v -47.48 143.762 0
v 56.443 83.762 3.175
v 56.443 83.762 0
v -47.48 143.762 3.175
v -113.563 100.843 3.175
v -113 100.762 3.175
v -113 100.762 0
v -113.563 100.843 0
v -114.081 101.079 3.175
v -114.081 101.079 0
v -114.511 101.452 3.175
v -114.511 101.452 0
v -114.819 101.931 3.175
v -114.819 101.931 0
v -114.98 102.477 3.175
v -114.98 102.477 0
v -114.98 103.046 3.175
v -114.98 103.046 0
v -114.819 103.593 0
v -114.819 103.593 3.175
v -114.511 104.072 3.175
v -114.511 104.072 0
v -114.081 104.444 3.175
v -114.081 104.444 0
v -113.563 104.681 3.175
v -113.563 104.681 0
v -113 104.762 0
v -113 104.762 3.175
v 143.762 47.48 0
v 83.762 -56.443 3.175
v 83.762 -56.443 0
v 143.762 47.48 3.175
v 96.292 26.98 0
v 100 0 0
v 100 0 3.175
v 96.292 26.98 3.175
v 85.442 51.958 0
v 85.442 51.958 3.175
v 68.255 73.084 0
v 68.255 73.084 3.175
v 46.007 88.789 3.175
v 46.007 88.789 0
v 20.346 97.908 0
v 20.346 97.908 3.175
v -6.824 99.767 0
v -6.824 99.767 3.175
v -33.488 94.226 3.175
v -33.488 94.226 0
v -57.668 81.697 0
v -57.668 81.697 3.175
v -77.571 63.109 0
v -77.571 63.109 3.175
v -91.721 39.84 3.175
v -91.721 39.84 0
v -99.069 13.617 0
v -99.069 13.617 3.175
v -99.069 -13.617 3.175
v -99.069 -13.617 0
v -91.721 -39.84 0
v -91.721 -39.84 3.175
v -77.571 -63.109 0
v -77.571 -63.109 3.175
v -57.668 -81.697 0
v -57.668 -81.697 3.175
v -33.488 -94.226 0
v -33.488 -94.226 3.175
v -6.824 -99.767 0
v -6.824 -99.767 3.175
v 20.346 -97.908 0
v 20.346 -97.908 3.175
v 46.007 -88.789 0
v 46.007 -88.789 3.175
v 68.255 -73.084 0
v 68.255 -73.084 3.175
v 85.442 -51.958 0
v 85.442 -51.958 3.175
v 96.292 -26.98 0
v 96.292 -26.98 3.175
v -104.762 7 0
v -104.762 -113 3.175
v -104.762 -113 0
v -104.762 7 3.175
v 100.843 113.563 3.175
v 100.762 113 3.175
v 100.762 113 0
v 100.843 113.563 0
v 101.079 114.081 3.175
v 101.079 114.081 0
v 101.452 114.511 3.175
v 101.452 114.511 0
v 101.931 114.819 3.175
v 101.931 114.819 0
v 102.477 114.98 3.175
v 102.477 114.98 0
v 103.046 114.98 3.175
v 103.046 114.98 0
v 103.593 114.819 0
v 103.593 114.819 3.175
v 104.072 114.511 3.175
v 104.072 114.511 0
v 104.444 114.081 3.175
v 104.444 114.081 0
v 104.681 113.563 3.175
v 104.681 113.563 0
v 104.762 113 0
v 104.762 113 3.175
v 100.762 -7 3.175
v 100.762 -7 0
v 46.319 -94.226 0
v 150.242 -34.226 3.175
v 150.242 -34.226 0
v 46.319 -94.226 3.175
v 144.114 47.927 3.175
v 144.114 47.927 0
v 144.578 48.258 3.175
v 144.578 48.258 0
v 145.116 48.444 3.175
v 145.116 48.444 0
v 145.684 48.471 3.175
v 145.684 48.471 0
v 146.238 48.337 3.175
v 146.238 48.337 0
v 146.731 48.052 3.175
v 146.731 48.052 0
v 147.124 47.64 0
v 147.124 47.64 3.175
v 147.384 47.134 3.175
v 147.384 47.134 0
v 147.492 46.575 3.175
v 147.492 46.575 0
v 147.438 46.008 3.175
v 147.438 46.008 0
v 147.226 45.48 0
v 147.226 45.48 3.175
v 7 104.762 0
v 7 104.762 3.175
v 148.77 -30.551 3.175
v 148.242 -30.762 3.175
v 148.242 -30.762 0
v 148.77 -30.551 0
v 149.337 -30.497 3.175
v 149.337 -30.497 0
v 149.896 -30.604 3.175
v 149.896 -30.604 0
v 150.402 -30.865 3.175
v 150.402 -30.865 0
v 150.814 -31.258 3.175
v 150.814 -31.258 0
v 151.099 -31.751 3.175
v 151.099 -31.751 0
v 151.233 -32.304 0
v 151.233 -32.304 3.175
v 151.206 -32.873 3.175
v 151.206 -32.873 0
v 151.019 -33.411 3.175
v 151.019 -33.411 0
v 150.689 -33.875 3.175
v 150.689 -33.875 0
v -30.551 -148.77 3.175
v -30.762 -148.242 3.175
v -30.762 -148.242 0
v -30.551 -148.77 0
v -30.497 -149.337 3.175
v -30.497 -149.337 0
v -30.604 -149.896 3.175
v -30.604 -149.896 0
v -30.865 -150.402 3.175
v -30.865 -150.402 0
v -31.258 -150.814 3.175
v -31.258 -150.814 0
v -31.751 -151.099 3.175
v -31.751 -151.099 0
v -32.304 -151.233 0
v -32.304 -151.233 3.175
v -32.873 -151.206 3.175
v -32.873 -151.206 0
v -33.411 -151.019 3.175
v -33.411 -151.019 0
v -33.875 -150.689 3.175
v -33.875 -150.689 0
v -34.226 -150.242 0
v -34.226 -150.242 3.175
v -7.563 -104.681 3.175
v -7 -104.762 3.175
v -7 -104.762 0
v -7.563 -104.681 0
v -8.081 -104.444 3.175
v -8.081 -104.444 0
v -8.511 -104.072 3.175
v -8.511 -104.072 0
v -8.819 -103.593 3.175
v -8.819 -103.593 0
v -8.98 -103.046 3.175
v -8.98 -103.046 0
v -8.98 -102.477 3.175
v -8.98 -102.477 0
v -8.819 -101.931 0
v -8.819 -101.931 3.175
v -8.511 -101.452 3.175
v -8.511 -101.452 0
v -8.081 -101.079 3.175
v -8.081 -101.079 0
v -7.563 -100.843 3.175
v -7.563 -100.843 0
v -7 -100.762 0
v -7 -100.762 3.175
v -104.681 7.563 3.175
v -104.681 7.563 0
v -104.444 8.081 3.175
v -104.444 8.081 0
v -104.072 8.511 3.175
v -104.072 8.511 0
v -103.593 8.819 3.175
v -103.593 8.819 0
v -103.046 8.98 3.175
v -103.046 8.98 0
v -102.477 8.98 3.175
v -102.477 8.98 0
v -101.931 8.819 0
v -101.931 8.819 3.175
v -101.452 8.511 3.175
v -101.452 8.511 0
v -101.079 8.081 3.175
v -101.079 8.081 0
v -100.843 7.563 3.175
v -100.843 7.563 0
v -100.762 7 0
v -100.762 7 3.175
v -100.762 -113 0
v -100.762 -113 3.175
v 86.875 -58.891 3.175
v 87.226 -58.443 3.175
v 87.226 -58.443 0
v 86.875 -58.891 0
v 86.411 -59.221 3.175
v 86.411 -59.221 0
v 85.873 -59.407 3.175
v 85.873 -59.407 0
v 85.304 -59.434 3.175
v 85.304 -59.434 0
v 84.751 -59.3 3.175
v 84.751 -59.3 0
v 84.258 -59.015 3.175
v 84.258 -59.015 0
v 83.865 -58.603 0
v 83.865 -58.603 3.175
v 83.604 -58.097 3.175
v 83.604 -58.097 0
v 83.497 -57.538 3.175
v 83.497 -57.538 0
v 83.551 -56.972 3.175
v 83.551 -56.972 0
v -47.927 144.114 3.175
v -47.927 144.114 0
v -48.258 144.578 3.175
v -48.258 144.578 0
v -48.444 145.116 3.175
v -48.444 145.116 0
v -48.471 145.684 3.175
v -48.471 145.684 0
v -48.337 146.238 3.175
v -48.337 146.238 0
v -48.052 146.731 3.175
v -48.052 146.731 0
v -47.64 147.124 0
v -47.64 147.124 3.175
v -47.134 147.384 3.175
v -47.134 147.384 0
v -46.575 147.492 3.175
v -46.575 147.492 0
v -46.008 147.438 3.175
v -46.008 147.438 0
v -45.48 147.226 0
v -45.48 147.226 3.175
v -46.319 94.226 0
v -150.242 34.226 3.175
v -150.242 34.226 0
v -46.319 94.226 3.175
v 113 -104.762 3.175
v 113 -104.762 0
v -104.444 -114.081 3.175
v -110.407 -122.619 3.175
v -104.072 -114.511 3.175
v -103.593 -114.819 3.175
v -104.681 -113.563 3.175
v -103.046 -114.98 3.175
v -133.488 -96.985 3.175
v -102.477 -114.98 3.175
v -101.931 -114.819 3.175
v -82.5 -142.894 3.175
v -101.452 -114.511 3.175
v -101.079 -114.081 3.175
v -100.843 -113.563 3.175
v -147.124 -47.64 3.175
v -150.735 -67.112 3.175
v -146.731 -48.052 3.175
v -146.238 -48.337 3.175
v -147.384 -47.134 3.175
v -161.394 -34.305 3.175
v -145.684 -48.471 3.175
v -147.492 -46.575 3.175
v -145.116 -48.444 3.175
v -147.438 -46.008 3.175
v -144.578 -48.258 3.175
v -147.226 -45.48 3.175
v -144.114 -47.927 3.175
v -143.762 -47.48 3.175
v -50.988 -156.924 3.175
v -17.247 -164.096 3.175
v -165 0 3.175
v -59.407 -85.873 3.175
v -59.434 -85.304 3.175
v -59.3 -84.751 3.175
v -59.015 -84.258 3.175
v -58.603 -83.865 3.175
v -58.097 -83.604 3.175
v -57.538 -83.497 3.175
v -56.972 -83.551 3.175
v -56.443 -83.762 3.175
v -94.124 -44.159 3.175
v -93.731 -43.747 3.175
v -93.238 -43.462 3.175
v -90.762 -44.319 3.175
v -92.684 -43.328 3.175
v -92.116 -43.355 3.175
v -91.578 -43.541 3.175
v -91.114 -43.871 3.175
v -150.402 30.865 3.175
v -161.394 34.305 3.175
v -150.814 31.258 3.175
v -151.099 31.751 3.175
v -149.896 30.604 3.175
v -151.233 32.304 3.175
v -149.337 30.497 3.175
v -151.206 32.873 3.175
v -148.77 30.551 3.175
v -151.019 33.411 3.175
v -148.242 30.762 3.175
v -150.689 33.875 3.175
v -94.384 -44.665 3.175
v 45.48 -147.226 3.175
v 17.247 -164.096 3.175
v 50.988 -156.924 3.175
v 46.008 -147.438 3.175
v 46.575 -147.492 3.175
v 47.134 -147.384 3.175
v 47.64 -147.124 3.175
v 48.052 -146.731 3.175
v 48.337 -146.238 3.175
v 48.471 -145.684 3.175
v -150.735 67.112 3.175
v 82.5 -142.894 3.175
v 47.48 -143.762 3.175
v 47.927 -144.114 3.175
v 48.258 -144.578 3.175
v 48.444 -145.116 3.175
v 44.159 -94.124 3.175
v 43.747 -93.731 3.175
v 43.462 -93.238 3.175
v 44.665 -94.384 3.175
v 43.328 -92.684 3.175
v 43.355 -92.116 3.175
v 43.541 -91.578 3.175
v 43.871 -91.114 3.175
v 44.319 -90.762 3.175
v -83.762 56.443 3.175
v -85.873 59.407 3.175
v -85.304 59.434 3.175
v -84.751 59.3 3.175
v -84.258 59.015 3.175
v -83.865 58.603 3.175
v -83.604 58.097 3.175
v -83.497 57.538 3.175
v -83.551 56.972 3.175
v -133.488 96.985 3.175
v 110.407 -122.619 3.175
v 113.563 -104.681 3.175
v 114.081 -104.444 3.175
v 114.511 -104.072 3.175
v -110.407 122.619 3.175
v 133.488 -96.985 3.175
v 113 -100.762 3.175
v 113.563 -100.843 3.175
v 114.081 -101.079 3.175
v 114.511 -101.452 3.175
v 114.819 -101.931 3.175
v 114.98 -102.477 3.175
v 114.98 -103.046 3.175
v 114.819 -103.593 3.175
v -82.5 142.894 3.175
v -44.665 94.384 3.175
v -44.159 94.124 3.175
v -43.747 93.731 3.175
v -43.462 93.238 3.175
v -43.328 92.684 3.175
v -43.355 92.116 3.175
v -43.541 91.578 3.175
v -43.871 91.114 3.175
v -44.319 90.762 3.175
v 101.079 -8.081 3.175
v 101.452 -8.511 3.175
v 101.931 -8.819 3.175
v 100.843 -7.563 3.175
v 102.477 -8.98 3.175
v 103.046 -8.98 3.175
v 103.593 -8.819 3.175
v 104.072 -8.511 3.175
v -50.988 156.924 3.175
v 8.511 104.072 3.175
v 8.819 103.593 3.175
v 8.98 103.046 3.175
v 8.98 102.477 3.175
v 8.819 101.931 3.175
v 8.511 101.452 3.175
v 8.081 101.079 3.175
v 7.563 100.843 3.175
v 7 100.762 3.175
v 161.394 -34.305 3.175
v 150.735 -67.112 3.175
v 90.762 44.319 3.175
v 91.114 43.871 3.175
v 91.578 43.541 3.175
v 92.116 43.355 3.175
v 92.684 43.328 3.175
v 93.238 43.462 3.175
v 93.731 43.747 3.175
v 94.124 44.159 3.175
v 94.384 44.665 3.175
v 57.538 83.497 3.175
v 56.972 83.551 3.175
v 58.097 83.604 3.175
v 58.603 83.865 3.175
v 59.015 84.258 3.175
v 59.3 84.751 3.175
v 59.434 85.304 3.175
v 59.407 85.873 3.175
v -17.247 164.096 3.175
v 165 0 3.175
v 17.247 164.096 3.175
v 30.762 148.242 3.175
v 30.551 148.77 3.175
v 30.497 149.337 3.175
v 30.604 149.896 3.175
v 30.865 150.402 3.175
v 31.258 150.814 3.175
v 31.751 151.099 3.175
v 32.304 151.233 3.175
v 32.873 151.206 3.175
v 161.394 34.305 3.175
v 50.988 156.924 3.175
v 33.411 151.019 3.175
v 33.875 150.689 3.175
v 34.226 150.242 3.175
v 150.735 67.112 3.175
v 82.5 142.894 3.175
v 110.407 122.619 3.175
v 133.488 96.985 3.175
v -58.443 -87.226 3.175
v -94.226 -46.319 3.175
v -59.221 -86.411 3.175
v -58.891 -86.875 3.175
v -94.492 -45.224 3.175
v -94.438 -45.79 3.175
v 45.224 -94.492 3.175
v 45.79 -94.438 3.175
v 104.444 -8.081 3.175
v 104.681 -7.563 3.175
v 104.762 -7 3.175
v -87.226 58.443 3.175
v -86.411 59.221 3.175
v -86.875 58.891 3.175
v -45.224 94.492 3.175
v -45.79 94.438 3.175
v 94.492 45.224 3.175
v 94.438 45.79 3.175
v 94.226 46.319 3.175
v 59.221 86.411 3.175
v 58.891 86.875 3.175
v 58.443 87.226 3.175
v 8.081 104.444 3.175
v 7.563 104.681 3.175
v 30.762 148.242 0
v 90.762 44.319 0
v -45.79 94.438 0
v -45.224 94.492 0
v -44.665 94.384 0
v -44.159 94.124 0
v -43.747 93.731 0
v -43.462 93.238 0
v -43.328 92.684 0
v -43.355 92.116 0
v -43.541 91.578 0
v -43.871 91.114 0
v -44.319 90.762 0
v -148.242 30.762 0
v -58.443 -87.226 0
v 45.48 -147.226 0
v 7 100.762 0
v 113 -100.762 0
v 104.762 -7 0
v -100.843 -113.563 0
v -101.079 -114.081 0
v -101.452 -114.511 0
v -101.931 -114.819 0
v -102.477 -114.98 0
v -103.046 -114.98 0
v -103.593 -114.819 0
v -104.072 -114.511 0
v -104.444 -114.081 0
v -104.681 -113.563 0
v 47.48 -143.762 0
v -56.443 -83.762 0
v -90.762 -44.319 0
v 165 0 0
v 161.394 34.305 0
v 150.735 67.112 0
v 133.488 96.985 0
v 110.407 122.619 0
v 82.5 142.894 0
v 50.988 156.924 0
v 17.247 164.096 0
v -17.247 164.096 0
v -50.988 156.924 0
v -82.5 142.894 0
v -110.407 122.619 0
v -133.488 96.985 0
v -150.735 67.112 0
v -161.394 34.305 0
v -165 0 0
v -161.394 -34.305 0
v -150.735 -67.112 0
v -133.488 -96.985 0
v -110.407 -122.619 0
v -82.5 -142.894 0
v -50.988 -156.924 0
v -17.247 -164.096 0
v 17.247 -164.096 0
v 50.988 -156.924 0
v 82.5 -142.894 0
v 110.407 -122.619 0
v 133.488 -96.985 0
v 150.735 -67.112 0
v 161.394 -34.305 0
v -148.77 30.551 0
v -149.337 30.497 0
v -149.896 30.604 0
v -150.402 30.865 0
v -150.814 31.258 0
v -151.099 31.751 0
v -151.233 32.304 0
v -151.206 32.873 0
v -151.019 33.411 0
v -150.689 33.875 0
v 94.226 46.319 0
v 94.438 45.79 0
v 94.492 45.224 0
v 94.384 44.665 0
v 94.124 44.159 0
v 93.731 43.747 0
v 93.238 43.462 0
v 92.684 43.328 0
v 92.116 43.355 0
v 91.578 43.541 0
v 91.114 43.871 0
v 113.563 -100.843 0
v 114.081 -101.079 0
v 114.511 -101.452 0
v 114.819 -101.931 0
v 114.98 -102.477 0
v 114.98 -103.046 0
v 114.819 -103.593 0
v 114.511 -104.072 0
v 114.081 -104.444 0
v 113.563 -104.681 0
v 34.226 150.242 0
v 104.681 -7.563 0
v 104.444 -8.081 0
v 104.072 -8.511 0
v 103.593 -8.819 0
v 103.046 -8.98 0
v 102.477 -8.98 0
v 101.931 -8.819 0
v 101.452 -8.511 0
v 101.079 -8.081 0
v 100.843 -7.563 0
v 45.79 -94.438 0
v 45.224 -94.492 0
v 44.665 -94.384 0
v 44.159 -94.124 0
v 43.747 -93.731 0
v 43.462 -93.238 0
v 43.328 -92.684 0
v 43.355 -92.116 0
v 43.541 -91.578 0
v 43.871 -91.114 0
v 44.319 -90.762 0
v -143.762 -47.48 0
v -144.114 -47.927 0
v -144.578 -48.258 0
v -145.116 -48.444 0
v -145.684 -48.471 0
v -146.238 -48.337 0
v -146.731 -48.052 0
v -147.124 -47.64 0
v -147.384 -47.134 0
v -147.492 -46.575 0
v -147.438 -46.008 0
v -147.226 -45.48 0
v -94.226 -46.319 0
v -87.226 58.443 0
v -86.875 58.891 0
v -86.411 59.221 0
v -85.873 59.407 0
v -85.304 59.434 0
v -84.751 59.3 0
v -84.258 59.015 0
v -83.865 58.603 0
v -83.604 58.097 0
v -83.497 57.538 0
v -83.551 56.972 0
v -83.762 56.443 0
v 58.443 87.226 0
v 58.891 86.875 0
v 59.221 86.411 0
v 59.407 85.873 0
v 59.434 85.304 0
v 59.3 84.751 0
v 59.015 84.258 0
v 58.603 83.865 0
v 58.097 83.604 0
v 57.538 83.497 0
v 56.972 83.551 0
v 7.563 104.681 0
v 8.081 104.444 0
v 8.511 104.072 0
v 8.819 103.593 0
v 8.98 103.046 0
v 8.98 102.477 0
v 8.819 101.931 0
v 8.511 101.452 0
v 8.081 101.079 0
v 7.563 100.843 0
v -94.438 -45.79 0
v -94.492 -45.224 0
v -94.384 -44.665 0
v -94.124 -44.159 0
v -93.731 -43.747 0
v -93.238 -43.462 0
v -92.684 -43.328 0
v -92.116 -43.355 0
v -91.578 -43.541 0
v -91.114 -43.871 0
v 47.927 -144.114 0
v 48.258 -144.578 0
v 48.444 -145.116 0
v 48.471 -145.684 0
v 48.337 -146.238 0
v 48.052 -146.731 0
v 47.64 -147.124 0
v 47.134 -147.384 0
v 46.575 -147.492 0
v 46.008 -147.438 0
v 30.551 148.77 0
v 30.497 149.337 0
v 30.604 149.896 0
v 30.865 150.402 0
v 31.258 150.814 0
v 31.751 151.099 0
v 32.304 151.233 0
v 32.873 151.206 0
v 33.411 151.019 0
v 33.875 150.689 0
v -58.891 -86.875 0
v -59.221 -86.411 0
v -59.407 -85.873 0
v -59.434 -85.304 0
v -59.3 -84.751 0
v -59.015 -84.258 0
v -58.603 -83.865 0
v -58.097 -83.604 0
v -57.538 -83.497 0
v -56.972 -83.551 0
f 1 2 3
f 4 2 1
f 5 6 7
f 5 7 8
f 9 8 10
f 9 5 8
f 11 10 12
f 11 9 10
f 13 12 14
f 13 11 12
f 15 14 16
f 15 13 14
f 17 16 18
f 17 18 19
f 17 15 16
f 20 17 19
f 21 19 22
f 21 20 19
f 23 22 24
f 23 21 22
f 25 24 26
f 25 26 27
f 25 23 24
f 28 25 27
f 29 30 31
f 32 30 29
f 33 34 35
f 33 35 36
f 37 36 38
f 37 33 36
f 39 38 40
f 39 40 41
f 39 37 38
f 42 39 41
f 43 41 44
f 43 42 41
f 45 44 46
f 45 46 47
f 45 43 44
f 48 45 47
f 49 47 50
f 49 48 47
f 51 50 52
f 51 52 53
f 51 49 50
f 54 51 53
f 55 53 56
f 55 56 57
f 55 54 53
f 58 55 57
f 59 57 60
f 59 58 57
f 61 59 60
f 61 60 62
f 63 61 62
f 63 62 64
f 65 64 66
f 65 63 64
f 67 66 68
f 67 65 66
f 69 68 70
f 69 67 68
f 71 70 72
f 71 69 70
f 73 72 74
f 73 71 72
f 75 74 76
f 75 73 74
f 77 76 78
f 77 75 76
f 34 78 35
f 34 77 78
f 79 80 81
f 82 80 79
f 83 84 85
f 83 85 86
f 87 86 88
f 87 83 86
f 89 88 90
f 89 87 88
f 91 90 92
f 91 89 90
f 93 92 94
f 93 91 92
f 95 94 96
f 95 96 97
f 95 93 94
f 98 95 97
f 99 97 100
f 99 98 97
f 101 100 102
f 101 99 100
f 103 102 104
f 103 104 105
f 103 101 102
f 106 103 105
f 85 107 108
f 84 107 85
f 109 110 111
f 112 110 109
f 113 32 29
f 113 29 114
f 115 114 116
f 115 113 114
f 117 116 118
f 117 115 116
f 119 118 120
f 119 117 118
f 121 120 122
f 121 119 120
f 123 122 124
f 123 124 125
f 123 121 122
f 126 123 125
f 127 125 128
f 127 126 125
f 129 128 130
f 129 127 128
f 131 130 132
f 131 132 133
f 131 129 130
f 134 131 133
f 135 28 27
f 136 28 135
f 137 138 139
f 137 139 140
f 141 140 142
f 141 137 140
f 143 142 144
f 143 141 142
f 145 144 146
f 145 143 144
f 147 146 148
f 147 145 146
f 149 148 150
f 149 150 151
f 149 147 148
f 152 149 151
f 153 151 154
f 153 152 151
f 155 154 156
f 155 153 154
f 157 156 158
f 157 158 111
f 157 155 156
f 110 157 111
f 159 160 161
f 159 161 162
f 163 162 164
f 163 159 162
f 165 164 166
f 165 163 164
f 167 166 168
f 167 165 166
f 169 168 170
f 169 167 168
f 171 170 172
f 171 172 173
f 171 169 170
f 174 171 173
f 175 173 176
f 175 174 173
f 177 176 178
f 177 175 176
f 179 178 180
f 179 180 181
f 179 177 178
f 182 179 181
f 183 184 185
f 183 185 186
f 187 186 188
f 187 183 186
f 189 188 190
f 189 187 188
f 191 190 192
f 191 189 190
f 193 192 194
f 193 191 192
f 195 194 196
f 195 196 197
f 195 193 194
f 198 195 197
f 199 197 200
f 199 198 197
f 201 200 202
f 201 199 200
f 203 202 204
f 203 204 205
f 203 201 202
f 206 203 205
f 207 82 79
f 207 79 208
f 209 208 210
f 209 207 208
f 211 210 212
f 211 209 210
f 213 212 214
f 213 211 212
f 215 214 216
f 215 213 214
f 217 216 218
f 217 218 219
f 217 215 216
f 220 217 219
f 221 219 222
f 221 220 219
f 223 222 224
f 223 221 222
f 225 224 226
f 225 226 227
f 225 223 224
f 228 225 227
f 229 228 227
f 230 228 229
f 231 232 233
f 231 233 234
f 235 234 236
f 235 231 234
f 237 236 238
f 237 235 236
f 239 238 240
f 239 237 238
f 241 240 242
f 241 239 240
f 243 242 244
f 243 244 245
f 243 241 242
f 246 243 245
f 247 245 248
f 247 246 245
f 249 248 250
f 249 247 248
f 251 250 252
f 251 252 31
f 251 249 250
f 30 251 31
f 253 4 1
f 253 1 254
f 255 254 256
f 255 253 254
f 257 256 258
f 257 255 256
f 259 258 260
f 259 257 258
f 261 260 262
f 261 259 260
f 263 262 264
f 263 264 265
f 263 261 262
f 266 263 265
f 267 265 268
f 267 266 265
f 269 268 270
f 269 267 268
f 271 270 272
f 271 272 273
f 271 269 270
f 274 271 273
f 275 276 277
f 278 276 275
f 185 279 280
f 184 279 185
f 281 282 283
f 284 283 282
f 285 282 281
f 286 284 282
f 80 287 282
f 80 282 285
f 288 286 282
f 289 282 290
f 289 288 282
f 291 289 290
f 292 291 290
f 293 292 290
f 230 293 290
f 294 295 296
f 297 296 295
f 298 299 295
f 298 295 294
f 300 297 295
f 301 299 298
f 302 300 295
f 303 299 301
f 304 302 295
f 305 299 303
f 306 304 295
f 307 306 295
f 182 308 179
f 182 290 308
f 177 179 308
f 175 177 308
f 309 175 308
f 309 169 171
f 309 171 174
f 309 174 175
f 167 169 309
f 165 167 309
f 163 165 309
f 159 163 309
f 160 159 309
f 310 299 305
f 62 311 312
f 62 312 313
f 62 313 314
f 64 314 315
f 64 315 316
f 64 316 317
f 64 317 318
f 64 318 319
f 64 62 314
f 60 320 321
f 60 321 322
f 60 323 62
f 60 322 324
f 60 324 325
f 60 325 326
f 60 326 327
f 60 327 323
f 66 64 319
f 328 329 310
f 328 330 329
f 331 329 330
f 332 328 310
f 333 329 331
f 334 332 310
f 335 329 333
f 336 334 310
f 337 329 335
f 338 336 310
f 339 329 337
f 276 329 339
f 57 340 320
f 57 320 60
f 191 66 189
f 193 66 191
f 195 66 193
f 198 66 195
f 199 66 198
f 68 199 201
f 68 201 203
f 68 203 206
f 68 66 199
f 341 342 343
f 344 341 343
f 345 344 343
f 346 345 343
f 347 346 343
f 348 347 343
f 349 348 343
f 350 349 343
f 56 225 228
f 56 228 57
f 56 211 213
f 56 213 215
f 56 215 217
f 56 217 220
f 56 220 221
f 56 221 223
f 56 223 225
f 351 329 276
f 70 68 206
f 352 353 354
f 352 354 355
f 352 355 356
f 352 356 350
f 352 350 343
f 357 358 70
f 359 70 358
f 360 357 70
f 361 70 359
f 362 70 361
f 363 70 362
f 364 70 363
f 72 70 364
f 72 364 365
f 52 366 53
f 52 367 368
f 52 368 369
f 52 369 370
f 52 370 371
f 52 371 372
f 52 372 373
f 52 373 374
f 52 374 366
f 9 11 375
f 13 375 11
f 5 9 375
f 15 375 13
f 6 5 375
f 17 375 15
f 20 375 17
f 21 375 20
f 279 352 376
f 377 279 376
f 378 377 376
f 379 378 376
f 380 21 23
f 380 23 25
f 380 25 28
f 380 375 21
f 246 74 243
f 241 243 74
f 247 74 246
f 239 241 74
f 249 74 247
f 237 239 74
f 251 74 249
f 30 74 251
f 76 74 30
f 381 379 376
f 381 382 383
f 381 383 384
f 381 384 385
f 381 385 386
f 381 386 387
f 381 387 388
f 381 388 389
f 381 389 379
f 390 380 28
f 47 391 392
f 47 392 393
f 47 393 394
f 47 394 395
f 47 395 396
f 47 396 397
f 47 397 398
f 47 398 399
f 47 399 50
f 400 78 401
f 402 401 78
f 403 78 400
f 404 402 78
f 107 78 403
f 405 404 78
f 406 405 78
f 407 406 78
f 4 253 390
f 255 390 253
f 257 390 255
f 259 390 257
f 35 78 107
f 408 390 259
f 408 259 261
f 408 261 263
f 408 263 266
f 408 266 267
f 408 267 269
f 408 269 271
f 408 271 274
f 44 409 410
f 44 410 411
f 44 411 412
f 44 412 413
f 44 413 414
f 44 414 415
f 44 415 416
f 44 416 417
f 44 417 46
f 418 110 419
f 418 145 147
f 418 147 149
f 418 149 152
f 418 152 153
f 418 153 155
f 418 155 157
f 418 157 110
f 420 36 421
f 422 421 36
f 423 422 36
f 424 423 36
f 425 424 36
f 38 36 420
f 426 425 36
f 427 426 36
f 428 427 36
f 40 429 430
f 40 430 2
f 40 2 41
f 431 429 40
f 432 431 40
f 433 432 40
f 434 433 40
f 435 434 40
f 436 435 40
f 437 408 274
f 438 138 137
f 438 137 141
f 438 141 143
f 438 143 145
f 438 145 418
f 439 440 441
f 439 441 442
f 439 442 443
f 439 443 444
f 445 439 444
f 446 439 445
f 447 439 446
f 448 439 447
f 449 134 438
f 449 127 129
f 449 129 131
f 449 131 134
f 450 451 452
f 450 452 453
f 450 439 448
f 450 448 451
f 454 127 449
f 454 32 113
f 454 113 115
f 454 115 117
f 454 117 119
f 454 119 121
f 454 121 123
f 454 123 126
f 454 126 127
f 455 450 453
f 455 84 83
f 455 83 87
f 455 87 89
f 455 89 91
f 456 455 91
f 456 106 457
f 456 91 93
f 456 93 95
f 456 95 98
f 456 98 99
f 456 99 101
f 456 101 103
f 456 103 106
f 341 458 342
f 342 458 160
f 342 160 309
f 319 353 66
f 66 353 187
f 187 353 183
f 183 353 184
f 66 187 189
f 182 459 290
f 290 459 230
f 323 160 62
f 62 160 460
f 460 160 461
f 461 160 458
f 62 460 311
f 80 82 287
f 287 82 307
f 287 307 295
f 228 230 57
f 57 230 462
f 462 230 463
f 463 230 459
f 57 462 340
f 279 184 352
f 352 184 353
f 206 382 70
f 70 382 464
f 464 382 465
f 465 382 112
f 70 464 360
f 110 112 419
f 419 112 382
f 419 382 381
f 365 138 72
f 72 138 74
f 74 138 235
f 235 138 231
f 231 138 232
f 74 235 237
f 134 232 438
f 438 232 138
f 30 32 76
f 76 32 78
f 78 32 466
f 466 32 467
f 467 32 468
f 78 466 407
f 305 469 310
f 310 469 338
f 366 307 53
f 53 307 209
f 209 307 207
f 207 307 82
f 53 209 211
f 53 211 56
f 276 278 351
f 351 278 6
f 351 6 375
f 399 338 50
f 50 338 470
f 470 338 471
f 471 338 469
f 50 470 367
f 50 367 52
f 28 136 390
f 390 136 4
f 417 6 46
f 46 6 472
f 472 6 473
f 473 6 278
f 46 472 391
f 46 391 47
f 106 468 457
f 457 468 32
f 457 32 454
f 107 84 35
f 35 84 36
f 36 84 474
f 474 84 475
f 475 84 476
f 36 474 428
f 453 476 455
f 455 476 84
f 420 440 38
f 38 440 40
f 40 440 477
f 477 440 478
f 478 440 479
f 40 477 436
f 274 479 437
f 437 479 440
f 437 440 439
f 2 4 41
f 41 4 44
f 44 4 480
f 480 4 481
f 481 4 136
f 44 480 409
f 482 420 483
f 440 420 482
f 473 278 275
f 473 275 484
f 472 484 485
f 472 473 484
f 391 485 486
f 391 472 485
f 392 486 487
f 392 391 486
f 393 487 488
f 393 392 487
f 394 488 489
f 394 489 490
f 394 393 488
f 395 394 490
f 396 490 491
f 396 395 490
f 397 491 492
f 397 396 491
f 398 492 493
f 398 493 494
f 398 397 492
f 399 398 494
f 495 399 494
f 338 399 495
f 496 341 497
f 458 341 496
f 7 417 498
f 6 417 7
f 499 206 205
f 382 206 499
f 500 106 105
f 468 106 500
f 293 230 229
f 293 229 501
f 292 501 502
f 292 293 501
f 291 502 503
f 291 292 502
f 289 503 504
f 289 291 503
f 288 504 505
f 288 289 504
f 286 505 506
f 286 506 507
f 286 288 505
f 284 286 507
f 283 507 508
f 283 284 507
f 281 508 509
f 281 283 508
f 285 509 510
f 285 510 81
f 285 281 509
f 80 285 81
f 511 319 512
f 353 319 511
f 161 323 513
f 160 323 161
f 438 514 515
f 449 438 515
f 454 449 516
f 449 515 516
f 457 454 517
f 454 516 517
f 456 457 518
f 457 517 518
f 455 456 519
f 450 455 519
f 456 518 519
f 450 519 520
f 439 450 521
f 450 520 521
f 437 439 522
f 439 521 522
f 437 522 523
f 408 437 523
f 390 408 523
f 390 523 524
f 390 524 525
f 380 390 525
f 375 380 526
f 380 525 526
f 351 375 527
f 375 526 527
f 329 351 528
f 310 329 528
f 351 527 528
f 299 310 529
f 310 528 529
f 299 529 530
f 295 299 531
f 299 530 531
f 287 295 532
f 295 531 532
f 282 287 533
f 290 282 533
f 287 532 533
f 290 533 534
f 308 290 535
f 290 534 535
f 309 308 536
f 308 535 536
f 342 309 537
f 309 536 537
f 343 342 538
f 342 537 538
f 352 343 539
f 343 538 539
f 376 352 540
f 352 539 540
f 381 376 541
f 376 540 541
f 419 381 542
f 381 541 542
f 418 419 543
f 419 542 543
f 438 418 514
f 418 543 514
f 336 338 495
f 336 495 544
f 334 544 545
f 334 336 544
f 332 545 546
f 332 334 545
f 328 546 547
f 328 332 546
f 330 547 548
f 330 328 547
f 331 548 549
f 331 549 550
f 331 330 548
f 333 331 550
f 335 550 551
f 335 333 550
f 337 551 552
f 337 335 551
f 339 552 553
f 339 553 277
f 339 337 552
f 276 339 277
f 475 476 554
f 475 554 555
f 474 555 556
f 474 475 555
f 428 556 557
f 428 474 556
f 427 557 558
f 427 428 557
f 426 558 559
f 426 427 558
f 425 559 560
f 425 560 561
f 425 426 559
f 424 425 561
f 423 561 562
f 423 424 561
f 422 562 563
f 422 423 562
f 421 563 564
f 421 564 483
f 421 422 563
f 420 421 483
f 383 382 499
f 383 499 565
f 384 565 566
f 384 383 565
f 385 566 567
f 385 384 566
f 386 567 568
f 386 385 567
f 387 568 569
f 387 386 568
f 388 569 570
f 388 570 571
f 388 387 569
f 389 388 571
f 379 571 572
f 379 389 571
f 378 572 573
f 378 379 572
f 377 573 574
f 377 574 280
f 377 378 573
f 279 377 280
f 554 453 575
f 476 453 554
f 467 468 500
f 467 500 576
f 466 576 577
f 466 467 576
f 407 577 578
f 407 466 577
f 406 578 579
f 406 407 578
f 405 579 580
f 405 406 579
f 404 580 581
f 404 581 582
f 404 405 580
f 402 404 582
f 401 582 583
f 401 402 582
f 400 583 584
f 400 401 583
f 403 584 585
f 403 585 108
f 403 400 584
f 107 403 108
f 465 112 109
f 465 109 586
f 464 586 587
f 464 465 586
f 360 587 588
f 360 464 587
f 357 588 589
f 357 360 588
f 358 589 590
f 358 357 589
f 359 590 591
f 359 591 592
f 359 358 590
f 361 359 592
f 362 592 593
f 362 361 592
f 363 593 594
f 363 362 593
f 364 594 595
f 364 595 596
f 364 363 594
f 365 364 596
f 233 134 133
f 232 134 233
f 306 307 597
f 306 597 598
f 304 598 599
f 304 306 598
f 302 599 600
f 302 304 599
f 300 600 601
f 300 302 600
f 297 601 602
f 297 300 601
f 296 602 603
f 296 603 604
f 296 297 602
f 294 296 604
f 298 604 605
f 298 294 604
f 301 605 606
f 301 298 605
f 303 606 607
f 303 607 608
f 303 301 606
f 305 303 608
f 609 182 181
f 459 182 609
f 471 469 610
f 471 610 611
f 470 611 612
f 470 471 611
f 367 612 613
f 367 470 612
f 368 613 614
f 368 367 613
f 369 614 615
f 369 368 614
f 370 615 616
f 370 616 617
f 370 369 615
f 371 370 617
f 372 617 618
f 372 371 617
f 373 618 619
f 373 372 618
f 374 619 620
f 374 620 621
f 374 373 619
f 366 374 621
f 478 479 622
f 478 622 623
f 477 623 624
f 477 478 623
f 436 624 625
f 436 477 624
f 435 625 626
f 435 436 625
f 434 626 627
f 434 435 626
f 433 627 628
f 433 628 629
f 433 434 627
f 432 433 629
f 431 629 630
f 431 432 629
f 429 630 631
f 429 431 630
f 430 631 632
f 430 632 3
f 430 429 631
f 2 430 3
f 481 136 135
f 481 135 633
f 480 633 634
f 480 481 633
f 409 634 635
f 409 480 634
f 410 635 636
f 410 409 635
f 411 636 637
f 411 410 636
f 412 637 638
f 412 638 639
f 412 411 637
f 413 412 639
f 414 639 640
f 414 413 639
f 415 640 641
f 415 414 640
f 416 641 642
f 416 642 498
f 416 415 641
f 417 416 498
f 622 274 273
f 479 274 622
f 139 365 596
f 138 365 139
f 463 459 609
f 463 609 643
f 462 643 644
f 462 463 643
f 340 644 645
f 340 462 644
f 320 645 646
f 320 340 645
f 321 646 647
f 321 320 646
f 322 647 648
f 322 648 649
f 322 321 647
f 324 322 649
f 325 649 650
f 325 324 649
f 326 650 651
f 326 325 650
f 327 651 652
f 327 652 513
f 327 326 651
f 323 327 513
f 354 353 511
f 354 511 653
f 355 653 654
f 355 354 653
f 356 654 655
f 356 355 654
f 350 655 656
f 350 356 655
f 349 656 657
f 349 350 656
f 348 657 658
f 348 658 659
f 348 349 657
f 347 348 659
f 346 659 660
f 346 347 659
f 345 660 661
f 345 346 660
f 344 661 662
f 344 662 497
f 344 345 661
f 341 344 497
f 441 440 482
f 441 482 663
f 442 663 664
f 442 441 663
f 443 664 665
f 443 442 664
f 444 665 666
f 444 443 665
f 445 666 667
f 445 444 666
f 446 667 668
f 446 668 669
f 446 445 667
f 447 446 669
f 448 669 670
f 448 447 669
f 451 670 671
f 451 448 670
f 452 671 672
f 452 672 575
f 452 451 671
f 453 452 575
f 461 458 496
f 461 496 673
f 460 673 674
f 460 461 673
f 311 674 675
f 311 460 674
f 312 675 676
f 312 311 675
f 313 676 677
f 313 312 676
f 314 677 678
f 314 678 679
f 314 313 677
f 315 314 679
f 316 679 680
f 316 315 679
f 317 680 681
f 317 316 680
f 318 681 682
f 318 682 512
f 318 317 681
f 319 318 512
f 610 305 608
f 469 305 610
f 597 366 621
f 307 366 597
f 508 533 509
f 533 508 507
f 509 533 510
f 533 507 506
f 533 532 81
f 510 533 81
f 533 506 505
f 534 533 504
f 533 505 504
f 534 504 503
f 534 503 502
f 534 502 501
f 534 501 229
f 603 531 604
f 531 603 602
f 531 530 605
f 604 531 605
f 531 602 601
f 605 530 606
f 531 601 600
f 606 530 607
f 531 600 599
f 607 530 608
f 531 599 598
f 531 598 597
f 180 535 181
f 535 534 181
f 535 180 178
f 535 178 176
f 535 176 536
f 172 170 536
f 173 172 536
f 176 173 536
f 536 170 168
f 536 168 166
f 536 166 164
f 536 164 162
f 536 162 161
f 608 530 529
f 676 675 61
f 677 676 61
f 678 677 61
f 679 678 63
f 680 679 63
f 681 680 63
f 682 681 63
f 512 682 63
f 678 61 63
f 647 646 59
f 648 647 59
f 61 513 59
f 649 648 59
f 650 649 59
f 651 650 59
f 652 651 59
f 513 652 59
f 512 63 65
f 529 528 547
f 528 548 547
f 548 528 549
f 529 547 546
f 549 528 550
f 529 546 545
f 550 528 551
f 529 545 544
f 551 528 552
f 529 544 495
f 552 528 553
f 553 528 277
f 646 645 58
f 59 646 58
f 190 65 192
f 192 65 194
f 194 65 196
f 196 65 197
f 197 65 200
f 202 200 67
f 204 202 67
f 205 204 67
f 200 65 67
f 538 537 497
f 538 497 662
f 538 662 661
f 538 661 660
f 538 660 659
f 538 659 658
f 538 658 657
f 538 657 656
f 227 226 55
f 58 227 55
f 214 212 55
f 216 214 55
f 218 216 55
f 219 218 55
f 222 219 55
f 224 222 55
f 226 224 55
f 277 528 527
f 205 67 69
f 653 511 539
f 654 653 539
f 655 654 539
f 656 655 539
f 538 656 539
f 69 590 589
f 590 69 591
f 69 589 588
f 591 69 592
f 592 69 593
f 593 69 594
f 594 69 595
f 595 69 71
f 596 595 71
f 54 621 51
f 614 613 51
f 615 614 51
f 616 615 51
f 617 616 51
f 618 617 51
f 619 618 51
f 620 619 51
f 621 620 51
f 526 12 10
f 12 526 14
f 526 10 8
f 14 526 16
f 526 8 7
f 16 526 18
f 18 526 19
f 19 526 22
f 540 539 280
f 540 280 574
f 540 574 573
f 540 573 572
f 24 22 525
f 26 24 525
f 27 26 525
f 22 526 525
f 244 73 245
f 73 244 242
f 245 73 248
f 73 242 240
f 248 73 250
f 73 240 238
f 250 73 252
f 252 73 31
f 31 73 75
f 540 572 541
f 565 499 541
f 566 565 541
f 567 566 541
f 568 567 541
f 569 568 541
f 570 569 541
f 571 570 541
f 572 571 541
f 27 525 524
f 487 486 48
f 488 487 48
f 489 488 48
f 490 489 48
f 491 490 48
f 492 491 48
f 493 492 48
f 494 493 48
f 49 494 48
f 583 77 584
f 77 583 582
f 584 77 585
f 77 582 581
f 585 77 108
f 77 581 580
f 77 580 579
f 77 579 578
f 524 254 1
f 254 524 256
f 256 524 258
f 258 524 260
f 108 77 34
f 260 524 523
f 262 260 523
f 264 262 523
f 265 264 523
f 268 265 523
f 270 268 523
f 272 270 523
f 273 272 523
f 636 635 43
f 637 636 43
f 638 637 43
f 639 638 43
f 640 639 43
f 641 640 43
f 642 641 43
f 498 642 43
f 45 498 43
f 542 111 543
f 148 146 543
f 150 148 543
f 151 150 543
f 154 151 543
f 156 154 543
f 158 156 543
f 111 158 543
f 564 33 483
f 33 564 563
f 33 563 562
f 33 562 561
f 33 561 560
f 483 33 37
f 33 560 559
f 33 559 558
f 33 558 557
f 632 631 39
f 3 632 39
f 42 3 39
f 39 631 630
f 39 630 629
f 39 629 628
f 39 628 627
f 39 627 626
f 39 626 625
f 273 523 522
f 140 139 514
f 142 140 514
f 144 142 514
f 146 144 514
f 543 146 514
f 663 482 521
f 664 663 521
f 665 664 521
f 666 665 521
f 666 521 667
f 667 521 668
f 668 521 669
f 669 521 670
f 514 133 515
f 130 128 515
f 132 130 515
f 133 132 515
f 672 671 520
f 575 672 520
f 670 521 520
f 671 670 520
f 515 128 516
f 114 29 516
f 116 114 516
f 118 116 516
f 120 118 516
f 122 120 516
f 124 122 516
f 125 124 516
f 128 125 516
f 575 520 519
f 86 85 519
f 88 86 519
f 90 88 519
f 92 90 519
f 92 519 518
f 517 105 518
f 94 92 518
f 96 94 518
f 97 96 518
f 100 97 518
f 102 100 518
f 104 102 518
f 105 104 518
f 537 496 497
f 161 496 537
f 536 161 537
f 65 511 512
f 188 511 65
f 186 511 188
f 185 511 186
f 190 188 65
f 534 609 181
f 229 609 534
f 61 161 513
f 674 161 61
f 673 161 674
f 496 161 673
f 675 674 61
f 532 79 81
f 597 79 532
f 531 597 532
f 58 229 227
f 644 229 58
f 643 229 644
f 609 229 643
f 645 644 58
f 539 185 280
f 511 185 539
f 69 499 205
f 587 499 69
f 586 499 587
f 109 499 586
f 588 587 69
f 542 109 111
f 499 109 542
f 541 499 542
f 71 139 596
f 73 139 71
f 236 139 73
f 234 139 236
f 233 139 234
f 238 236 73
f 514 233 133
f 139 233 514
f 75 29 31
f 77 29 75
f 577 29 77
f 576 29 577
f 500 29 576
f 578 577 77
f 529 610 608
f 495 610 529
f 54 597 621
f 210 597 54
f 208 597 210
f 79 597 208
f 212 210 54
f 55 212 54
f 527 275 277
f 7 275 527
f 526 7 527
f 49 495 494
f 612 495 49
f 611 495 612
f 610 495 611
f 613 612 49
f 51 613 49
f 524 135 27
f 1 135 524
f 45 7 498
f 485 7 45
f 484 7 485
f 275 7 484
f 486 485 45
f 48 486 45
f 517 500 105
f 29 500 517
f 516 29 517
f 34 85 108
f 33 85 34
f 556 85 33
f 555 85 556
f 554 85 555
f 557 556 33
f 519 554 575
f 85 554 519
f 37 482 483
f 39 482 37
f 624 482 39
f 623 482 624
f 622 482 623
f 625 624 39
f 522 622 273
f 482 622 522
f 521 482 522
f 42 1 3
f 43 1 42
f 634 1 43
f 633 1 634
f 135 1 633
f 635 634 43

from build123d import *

# Parameters (mm, degrees)
SKETCH1_R           = 165
SKETCH1_R_2         = 100
BOSS_EXTRUDE1_DEPTH = 3.175
CUT_EXTRUDE1_DEPTH  = 3.175
CIRPATTERN1_COUNT   = 12


with BuildPart() as part:
    # Sketch1 → Boss-Extrude1 (new body)
    with BuildSketch(Plane.XY):
        Circle(SKETCH1_R)
        Circle(SKETCH1_R_2, mode=Mode.SUBTRACT)
    extrude(amount=BOSS_EXTRUDE1_DEPTH)

    # Sketch2 → Cut-Extrude1 (cut)
    with BuildSketch(Plane.XY.offset(3.175)):
        with BuildLine():
            Line((-113, 104.761860629), (7, 104.761860629))
            ThreePointArc((7, 104.761860629), (9, 102.761860629), (7, 100.761860629))
            Line((7, 100.761860629), (-113, 100.761860629))
            ThreePointArc((-113, 100.761860629), (-115, 102.761860629), (-113, 104.761860629))
        make_face()
    cut_extrude1 = extrude(amount=-CUT_EXTRUDE1_DEPTH, mode=Mode.SUBTRACT)

    # CirPattern1: Cut-Extrude1 ×12 about axis
    cirpattern1_axis = Axis((0, 0, 0), (0, 0, 1))
    for i in range(1, CIRPATTERN1_COUNT):
        add(cut_extrude1.rotate(cirpattern1_axis, i * 360 / CIRPATTERN1_COUNT), mode=Mode.SUBTRACT)


solid = part.part
